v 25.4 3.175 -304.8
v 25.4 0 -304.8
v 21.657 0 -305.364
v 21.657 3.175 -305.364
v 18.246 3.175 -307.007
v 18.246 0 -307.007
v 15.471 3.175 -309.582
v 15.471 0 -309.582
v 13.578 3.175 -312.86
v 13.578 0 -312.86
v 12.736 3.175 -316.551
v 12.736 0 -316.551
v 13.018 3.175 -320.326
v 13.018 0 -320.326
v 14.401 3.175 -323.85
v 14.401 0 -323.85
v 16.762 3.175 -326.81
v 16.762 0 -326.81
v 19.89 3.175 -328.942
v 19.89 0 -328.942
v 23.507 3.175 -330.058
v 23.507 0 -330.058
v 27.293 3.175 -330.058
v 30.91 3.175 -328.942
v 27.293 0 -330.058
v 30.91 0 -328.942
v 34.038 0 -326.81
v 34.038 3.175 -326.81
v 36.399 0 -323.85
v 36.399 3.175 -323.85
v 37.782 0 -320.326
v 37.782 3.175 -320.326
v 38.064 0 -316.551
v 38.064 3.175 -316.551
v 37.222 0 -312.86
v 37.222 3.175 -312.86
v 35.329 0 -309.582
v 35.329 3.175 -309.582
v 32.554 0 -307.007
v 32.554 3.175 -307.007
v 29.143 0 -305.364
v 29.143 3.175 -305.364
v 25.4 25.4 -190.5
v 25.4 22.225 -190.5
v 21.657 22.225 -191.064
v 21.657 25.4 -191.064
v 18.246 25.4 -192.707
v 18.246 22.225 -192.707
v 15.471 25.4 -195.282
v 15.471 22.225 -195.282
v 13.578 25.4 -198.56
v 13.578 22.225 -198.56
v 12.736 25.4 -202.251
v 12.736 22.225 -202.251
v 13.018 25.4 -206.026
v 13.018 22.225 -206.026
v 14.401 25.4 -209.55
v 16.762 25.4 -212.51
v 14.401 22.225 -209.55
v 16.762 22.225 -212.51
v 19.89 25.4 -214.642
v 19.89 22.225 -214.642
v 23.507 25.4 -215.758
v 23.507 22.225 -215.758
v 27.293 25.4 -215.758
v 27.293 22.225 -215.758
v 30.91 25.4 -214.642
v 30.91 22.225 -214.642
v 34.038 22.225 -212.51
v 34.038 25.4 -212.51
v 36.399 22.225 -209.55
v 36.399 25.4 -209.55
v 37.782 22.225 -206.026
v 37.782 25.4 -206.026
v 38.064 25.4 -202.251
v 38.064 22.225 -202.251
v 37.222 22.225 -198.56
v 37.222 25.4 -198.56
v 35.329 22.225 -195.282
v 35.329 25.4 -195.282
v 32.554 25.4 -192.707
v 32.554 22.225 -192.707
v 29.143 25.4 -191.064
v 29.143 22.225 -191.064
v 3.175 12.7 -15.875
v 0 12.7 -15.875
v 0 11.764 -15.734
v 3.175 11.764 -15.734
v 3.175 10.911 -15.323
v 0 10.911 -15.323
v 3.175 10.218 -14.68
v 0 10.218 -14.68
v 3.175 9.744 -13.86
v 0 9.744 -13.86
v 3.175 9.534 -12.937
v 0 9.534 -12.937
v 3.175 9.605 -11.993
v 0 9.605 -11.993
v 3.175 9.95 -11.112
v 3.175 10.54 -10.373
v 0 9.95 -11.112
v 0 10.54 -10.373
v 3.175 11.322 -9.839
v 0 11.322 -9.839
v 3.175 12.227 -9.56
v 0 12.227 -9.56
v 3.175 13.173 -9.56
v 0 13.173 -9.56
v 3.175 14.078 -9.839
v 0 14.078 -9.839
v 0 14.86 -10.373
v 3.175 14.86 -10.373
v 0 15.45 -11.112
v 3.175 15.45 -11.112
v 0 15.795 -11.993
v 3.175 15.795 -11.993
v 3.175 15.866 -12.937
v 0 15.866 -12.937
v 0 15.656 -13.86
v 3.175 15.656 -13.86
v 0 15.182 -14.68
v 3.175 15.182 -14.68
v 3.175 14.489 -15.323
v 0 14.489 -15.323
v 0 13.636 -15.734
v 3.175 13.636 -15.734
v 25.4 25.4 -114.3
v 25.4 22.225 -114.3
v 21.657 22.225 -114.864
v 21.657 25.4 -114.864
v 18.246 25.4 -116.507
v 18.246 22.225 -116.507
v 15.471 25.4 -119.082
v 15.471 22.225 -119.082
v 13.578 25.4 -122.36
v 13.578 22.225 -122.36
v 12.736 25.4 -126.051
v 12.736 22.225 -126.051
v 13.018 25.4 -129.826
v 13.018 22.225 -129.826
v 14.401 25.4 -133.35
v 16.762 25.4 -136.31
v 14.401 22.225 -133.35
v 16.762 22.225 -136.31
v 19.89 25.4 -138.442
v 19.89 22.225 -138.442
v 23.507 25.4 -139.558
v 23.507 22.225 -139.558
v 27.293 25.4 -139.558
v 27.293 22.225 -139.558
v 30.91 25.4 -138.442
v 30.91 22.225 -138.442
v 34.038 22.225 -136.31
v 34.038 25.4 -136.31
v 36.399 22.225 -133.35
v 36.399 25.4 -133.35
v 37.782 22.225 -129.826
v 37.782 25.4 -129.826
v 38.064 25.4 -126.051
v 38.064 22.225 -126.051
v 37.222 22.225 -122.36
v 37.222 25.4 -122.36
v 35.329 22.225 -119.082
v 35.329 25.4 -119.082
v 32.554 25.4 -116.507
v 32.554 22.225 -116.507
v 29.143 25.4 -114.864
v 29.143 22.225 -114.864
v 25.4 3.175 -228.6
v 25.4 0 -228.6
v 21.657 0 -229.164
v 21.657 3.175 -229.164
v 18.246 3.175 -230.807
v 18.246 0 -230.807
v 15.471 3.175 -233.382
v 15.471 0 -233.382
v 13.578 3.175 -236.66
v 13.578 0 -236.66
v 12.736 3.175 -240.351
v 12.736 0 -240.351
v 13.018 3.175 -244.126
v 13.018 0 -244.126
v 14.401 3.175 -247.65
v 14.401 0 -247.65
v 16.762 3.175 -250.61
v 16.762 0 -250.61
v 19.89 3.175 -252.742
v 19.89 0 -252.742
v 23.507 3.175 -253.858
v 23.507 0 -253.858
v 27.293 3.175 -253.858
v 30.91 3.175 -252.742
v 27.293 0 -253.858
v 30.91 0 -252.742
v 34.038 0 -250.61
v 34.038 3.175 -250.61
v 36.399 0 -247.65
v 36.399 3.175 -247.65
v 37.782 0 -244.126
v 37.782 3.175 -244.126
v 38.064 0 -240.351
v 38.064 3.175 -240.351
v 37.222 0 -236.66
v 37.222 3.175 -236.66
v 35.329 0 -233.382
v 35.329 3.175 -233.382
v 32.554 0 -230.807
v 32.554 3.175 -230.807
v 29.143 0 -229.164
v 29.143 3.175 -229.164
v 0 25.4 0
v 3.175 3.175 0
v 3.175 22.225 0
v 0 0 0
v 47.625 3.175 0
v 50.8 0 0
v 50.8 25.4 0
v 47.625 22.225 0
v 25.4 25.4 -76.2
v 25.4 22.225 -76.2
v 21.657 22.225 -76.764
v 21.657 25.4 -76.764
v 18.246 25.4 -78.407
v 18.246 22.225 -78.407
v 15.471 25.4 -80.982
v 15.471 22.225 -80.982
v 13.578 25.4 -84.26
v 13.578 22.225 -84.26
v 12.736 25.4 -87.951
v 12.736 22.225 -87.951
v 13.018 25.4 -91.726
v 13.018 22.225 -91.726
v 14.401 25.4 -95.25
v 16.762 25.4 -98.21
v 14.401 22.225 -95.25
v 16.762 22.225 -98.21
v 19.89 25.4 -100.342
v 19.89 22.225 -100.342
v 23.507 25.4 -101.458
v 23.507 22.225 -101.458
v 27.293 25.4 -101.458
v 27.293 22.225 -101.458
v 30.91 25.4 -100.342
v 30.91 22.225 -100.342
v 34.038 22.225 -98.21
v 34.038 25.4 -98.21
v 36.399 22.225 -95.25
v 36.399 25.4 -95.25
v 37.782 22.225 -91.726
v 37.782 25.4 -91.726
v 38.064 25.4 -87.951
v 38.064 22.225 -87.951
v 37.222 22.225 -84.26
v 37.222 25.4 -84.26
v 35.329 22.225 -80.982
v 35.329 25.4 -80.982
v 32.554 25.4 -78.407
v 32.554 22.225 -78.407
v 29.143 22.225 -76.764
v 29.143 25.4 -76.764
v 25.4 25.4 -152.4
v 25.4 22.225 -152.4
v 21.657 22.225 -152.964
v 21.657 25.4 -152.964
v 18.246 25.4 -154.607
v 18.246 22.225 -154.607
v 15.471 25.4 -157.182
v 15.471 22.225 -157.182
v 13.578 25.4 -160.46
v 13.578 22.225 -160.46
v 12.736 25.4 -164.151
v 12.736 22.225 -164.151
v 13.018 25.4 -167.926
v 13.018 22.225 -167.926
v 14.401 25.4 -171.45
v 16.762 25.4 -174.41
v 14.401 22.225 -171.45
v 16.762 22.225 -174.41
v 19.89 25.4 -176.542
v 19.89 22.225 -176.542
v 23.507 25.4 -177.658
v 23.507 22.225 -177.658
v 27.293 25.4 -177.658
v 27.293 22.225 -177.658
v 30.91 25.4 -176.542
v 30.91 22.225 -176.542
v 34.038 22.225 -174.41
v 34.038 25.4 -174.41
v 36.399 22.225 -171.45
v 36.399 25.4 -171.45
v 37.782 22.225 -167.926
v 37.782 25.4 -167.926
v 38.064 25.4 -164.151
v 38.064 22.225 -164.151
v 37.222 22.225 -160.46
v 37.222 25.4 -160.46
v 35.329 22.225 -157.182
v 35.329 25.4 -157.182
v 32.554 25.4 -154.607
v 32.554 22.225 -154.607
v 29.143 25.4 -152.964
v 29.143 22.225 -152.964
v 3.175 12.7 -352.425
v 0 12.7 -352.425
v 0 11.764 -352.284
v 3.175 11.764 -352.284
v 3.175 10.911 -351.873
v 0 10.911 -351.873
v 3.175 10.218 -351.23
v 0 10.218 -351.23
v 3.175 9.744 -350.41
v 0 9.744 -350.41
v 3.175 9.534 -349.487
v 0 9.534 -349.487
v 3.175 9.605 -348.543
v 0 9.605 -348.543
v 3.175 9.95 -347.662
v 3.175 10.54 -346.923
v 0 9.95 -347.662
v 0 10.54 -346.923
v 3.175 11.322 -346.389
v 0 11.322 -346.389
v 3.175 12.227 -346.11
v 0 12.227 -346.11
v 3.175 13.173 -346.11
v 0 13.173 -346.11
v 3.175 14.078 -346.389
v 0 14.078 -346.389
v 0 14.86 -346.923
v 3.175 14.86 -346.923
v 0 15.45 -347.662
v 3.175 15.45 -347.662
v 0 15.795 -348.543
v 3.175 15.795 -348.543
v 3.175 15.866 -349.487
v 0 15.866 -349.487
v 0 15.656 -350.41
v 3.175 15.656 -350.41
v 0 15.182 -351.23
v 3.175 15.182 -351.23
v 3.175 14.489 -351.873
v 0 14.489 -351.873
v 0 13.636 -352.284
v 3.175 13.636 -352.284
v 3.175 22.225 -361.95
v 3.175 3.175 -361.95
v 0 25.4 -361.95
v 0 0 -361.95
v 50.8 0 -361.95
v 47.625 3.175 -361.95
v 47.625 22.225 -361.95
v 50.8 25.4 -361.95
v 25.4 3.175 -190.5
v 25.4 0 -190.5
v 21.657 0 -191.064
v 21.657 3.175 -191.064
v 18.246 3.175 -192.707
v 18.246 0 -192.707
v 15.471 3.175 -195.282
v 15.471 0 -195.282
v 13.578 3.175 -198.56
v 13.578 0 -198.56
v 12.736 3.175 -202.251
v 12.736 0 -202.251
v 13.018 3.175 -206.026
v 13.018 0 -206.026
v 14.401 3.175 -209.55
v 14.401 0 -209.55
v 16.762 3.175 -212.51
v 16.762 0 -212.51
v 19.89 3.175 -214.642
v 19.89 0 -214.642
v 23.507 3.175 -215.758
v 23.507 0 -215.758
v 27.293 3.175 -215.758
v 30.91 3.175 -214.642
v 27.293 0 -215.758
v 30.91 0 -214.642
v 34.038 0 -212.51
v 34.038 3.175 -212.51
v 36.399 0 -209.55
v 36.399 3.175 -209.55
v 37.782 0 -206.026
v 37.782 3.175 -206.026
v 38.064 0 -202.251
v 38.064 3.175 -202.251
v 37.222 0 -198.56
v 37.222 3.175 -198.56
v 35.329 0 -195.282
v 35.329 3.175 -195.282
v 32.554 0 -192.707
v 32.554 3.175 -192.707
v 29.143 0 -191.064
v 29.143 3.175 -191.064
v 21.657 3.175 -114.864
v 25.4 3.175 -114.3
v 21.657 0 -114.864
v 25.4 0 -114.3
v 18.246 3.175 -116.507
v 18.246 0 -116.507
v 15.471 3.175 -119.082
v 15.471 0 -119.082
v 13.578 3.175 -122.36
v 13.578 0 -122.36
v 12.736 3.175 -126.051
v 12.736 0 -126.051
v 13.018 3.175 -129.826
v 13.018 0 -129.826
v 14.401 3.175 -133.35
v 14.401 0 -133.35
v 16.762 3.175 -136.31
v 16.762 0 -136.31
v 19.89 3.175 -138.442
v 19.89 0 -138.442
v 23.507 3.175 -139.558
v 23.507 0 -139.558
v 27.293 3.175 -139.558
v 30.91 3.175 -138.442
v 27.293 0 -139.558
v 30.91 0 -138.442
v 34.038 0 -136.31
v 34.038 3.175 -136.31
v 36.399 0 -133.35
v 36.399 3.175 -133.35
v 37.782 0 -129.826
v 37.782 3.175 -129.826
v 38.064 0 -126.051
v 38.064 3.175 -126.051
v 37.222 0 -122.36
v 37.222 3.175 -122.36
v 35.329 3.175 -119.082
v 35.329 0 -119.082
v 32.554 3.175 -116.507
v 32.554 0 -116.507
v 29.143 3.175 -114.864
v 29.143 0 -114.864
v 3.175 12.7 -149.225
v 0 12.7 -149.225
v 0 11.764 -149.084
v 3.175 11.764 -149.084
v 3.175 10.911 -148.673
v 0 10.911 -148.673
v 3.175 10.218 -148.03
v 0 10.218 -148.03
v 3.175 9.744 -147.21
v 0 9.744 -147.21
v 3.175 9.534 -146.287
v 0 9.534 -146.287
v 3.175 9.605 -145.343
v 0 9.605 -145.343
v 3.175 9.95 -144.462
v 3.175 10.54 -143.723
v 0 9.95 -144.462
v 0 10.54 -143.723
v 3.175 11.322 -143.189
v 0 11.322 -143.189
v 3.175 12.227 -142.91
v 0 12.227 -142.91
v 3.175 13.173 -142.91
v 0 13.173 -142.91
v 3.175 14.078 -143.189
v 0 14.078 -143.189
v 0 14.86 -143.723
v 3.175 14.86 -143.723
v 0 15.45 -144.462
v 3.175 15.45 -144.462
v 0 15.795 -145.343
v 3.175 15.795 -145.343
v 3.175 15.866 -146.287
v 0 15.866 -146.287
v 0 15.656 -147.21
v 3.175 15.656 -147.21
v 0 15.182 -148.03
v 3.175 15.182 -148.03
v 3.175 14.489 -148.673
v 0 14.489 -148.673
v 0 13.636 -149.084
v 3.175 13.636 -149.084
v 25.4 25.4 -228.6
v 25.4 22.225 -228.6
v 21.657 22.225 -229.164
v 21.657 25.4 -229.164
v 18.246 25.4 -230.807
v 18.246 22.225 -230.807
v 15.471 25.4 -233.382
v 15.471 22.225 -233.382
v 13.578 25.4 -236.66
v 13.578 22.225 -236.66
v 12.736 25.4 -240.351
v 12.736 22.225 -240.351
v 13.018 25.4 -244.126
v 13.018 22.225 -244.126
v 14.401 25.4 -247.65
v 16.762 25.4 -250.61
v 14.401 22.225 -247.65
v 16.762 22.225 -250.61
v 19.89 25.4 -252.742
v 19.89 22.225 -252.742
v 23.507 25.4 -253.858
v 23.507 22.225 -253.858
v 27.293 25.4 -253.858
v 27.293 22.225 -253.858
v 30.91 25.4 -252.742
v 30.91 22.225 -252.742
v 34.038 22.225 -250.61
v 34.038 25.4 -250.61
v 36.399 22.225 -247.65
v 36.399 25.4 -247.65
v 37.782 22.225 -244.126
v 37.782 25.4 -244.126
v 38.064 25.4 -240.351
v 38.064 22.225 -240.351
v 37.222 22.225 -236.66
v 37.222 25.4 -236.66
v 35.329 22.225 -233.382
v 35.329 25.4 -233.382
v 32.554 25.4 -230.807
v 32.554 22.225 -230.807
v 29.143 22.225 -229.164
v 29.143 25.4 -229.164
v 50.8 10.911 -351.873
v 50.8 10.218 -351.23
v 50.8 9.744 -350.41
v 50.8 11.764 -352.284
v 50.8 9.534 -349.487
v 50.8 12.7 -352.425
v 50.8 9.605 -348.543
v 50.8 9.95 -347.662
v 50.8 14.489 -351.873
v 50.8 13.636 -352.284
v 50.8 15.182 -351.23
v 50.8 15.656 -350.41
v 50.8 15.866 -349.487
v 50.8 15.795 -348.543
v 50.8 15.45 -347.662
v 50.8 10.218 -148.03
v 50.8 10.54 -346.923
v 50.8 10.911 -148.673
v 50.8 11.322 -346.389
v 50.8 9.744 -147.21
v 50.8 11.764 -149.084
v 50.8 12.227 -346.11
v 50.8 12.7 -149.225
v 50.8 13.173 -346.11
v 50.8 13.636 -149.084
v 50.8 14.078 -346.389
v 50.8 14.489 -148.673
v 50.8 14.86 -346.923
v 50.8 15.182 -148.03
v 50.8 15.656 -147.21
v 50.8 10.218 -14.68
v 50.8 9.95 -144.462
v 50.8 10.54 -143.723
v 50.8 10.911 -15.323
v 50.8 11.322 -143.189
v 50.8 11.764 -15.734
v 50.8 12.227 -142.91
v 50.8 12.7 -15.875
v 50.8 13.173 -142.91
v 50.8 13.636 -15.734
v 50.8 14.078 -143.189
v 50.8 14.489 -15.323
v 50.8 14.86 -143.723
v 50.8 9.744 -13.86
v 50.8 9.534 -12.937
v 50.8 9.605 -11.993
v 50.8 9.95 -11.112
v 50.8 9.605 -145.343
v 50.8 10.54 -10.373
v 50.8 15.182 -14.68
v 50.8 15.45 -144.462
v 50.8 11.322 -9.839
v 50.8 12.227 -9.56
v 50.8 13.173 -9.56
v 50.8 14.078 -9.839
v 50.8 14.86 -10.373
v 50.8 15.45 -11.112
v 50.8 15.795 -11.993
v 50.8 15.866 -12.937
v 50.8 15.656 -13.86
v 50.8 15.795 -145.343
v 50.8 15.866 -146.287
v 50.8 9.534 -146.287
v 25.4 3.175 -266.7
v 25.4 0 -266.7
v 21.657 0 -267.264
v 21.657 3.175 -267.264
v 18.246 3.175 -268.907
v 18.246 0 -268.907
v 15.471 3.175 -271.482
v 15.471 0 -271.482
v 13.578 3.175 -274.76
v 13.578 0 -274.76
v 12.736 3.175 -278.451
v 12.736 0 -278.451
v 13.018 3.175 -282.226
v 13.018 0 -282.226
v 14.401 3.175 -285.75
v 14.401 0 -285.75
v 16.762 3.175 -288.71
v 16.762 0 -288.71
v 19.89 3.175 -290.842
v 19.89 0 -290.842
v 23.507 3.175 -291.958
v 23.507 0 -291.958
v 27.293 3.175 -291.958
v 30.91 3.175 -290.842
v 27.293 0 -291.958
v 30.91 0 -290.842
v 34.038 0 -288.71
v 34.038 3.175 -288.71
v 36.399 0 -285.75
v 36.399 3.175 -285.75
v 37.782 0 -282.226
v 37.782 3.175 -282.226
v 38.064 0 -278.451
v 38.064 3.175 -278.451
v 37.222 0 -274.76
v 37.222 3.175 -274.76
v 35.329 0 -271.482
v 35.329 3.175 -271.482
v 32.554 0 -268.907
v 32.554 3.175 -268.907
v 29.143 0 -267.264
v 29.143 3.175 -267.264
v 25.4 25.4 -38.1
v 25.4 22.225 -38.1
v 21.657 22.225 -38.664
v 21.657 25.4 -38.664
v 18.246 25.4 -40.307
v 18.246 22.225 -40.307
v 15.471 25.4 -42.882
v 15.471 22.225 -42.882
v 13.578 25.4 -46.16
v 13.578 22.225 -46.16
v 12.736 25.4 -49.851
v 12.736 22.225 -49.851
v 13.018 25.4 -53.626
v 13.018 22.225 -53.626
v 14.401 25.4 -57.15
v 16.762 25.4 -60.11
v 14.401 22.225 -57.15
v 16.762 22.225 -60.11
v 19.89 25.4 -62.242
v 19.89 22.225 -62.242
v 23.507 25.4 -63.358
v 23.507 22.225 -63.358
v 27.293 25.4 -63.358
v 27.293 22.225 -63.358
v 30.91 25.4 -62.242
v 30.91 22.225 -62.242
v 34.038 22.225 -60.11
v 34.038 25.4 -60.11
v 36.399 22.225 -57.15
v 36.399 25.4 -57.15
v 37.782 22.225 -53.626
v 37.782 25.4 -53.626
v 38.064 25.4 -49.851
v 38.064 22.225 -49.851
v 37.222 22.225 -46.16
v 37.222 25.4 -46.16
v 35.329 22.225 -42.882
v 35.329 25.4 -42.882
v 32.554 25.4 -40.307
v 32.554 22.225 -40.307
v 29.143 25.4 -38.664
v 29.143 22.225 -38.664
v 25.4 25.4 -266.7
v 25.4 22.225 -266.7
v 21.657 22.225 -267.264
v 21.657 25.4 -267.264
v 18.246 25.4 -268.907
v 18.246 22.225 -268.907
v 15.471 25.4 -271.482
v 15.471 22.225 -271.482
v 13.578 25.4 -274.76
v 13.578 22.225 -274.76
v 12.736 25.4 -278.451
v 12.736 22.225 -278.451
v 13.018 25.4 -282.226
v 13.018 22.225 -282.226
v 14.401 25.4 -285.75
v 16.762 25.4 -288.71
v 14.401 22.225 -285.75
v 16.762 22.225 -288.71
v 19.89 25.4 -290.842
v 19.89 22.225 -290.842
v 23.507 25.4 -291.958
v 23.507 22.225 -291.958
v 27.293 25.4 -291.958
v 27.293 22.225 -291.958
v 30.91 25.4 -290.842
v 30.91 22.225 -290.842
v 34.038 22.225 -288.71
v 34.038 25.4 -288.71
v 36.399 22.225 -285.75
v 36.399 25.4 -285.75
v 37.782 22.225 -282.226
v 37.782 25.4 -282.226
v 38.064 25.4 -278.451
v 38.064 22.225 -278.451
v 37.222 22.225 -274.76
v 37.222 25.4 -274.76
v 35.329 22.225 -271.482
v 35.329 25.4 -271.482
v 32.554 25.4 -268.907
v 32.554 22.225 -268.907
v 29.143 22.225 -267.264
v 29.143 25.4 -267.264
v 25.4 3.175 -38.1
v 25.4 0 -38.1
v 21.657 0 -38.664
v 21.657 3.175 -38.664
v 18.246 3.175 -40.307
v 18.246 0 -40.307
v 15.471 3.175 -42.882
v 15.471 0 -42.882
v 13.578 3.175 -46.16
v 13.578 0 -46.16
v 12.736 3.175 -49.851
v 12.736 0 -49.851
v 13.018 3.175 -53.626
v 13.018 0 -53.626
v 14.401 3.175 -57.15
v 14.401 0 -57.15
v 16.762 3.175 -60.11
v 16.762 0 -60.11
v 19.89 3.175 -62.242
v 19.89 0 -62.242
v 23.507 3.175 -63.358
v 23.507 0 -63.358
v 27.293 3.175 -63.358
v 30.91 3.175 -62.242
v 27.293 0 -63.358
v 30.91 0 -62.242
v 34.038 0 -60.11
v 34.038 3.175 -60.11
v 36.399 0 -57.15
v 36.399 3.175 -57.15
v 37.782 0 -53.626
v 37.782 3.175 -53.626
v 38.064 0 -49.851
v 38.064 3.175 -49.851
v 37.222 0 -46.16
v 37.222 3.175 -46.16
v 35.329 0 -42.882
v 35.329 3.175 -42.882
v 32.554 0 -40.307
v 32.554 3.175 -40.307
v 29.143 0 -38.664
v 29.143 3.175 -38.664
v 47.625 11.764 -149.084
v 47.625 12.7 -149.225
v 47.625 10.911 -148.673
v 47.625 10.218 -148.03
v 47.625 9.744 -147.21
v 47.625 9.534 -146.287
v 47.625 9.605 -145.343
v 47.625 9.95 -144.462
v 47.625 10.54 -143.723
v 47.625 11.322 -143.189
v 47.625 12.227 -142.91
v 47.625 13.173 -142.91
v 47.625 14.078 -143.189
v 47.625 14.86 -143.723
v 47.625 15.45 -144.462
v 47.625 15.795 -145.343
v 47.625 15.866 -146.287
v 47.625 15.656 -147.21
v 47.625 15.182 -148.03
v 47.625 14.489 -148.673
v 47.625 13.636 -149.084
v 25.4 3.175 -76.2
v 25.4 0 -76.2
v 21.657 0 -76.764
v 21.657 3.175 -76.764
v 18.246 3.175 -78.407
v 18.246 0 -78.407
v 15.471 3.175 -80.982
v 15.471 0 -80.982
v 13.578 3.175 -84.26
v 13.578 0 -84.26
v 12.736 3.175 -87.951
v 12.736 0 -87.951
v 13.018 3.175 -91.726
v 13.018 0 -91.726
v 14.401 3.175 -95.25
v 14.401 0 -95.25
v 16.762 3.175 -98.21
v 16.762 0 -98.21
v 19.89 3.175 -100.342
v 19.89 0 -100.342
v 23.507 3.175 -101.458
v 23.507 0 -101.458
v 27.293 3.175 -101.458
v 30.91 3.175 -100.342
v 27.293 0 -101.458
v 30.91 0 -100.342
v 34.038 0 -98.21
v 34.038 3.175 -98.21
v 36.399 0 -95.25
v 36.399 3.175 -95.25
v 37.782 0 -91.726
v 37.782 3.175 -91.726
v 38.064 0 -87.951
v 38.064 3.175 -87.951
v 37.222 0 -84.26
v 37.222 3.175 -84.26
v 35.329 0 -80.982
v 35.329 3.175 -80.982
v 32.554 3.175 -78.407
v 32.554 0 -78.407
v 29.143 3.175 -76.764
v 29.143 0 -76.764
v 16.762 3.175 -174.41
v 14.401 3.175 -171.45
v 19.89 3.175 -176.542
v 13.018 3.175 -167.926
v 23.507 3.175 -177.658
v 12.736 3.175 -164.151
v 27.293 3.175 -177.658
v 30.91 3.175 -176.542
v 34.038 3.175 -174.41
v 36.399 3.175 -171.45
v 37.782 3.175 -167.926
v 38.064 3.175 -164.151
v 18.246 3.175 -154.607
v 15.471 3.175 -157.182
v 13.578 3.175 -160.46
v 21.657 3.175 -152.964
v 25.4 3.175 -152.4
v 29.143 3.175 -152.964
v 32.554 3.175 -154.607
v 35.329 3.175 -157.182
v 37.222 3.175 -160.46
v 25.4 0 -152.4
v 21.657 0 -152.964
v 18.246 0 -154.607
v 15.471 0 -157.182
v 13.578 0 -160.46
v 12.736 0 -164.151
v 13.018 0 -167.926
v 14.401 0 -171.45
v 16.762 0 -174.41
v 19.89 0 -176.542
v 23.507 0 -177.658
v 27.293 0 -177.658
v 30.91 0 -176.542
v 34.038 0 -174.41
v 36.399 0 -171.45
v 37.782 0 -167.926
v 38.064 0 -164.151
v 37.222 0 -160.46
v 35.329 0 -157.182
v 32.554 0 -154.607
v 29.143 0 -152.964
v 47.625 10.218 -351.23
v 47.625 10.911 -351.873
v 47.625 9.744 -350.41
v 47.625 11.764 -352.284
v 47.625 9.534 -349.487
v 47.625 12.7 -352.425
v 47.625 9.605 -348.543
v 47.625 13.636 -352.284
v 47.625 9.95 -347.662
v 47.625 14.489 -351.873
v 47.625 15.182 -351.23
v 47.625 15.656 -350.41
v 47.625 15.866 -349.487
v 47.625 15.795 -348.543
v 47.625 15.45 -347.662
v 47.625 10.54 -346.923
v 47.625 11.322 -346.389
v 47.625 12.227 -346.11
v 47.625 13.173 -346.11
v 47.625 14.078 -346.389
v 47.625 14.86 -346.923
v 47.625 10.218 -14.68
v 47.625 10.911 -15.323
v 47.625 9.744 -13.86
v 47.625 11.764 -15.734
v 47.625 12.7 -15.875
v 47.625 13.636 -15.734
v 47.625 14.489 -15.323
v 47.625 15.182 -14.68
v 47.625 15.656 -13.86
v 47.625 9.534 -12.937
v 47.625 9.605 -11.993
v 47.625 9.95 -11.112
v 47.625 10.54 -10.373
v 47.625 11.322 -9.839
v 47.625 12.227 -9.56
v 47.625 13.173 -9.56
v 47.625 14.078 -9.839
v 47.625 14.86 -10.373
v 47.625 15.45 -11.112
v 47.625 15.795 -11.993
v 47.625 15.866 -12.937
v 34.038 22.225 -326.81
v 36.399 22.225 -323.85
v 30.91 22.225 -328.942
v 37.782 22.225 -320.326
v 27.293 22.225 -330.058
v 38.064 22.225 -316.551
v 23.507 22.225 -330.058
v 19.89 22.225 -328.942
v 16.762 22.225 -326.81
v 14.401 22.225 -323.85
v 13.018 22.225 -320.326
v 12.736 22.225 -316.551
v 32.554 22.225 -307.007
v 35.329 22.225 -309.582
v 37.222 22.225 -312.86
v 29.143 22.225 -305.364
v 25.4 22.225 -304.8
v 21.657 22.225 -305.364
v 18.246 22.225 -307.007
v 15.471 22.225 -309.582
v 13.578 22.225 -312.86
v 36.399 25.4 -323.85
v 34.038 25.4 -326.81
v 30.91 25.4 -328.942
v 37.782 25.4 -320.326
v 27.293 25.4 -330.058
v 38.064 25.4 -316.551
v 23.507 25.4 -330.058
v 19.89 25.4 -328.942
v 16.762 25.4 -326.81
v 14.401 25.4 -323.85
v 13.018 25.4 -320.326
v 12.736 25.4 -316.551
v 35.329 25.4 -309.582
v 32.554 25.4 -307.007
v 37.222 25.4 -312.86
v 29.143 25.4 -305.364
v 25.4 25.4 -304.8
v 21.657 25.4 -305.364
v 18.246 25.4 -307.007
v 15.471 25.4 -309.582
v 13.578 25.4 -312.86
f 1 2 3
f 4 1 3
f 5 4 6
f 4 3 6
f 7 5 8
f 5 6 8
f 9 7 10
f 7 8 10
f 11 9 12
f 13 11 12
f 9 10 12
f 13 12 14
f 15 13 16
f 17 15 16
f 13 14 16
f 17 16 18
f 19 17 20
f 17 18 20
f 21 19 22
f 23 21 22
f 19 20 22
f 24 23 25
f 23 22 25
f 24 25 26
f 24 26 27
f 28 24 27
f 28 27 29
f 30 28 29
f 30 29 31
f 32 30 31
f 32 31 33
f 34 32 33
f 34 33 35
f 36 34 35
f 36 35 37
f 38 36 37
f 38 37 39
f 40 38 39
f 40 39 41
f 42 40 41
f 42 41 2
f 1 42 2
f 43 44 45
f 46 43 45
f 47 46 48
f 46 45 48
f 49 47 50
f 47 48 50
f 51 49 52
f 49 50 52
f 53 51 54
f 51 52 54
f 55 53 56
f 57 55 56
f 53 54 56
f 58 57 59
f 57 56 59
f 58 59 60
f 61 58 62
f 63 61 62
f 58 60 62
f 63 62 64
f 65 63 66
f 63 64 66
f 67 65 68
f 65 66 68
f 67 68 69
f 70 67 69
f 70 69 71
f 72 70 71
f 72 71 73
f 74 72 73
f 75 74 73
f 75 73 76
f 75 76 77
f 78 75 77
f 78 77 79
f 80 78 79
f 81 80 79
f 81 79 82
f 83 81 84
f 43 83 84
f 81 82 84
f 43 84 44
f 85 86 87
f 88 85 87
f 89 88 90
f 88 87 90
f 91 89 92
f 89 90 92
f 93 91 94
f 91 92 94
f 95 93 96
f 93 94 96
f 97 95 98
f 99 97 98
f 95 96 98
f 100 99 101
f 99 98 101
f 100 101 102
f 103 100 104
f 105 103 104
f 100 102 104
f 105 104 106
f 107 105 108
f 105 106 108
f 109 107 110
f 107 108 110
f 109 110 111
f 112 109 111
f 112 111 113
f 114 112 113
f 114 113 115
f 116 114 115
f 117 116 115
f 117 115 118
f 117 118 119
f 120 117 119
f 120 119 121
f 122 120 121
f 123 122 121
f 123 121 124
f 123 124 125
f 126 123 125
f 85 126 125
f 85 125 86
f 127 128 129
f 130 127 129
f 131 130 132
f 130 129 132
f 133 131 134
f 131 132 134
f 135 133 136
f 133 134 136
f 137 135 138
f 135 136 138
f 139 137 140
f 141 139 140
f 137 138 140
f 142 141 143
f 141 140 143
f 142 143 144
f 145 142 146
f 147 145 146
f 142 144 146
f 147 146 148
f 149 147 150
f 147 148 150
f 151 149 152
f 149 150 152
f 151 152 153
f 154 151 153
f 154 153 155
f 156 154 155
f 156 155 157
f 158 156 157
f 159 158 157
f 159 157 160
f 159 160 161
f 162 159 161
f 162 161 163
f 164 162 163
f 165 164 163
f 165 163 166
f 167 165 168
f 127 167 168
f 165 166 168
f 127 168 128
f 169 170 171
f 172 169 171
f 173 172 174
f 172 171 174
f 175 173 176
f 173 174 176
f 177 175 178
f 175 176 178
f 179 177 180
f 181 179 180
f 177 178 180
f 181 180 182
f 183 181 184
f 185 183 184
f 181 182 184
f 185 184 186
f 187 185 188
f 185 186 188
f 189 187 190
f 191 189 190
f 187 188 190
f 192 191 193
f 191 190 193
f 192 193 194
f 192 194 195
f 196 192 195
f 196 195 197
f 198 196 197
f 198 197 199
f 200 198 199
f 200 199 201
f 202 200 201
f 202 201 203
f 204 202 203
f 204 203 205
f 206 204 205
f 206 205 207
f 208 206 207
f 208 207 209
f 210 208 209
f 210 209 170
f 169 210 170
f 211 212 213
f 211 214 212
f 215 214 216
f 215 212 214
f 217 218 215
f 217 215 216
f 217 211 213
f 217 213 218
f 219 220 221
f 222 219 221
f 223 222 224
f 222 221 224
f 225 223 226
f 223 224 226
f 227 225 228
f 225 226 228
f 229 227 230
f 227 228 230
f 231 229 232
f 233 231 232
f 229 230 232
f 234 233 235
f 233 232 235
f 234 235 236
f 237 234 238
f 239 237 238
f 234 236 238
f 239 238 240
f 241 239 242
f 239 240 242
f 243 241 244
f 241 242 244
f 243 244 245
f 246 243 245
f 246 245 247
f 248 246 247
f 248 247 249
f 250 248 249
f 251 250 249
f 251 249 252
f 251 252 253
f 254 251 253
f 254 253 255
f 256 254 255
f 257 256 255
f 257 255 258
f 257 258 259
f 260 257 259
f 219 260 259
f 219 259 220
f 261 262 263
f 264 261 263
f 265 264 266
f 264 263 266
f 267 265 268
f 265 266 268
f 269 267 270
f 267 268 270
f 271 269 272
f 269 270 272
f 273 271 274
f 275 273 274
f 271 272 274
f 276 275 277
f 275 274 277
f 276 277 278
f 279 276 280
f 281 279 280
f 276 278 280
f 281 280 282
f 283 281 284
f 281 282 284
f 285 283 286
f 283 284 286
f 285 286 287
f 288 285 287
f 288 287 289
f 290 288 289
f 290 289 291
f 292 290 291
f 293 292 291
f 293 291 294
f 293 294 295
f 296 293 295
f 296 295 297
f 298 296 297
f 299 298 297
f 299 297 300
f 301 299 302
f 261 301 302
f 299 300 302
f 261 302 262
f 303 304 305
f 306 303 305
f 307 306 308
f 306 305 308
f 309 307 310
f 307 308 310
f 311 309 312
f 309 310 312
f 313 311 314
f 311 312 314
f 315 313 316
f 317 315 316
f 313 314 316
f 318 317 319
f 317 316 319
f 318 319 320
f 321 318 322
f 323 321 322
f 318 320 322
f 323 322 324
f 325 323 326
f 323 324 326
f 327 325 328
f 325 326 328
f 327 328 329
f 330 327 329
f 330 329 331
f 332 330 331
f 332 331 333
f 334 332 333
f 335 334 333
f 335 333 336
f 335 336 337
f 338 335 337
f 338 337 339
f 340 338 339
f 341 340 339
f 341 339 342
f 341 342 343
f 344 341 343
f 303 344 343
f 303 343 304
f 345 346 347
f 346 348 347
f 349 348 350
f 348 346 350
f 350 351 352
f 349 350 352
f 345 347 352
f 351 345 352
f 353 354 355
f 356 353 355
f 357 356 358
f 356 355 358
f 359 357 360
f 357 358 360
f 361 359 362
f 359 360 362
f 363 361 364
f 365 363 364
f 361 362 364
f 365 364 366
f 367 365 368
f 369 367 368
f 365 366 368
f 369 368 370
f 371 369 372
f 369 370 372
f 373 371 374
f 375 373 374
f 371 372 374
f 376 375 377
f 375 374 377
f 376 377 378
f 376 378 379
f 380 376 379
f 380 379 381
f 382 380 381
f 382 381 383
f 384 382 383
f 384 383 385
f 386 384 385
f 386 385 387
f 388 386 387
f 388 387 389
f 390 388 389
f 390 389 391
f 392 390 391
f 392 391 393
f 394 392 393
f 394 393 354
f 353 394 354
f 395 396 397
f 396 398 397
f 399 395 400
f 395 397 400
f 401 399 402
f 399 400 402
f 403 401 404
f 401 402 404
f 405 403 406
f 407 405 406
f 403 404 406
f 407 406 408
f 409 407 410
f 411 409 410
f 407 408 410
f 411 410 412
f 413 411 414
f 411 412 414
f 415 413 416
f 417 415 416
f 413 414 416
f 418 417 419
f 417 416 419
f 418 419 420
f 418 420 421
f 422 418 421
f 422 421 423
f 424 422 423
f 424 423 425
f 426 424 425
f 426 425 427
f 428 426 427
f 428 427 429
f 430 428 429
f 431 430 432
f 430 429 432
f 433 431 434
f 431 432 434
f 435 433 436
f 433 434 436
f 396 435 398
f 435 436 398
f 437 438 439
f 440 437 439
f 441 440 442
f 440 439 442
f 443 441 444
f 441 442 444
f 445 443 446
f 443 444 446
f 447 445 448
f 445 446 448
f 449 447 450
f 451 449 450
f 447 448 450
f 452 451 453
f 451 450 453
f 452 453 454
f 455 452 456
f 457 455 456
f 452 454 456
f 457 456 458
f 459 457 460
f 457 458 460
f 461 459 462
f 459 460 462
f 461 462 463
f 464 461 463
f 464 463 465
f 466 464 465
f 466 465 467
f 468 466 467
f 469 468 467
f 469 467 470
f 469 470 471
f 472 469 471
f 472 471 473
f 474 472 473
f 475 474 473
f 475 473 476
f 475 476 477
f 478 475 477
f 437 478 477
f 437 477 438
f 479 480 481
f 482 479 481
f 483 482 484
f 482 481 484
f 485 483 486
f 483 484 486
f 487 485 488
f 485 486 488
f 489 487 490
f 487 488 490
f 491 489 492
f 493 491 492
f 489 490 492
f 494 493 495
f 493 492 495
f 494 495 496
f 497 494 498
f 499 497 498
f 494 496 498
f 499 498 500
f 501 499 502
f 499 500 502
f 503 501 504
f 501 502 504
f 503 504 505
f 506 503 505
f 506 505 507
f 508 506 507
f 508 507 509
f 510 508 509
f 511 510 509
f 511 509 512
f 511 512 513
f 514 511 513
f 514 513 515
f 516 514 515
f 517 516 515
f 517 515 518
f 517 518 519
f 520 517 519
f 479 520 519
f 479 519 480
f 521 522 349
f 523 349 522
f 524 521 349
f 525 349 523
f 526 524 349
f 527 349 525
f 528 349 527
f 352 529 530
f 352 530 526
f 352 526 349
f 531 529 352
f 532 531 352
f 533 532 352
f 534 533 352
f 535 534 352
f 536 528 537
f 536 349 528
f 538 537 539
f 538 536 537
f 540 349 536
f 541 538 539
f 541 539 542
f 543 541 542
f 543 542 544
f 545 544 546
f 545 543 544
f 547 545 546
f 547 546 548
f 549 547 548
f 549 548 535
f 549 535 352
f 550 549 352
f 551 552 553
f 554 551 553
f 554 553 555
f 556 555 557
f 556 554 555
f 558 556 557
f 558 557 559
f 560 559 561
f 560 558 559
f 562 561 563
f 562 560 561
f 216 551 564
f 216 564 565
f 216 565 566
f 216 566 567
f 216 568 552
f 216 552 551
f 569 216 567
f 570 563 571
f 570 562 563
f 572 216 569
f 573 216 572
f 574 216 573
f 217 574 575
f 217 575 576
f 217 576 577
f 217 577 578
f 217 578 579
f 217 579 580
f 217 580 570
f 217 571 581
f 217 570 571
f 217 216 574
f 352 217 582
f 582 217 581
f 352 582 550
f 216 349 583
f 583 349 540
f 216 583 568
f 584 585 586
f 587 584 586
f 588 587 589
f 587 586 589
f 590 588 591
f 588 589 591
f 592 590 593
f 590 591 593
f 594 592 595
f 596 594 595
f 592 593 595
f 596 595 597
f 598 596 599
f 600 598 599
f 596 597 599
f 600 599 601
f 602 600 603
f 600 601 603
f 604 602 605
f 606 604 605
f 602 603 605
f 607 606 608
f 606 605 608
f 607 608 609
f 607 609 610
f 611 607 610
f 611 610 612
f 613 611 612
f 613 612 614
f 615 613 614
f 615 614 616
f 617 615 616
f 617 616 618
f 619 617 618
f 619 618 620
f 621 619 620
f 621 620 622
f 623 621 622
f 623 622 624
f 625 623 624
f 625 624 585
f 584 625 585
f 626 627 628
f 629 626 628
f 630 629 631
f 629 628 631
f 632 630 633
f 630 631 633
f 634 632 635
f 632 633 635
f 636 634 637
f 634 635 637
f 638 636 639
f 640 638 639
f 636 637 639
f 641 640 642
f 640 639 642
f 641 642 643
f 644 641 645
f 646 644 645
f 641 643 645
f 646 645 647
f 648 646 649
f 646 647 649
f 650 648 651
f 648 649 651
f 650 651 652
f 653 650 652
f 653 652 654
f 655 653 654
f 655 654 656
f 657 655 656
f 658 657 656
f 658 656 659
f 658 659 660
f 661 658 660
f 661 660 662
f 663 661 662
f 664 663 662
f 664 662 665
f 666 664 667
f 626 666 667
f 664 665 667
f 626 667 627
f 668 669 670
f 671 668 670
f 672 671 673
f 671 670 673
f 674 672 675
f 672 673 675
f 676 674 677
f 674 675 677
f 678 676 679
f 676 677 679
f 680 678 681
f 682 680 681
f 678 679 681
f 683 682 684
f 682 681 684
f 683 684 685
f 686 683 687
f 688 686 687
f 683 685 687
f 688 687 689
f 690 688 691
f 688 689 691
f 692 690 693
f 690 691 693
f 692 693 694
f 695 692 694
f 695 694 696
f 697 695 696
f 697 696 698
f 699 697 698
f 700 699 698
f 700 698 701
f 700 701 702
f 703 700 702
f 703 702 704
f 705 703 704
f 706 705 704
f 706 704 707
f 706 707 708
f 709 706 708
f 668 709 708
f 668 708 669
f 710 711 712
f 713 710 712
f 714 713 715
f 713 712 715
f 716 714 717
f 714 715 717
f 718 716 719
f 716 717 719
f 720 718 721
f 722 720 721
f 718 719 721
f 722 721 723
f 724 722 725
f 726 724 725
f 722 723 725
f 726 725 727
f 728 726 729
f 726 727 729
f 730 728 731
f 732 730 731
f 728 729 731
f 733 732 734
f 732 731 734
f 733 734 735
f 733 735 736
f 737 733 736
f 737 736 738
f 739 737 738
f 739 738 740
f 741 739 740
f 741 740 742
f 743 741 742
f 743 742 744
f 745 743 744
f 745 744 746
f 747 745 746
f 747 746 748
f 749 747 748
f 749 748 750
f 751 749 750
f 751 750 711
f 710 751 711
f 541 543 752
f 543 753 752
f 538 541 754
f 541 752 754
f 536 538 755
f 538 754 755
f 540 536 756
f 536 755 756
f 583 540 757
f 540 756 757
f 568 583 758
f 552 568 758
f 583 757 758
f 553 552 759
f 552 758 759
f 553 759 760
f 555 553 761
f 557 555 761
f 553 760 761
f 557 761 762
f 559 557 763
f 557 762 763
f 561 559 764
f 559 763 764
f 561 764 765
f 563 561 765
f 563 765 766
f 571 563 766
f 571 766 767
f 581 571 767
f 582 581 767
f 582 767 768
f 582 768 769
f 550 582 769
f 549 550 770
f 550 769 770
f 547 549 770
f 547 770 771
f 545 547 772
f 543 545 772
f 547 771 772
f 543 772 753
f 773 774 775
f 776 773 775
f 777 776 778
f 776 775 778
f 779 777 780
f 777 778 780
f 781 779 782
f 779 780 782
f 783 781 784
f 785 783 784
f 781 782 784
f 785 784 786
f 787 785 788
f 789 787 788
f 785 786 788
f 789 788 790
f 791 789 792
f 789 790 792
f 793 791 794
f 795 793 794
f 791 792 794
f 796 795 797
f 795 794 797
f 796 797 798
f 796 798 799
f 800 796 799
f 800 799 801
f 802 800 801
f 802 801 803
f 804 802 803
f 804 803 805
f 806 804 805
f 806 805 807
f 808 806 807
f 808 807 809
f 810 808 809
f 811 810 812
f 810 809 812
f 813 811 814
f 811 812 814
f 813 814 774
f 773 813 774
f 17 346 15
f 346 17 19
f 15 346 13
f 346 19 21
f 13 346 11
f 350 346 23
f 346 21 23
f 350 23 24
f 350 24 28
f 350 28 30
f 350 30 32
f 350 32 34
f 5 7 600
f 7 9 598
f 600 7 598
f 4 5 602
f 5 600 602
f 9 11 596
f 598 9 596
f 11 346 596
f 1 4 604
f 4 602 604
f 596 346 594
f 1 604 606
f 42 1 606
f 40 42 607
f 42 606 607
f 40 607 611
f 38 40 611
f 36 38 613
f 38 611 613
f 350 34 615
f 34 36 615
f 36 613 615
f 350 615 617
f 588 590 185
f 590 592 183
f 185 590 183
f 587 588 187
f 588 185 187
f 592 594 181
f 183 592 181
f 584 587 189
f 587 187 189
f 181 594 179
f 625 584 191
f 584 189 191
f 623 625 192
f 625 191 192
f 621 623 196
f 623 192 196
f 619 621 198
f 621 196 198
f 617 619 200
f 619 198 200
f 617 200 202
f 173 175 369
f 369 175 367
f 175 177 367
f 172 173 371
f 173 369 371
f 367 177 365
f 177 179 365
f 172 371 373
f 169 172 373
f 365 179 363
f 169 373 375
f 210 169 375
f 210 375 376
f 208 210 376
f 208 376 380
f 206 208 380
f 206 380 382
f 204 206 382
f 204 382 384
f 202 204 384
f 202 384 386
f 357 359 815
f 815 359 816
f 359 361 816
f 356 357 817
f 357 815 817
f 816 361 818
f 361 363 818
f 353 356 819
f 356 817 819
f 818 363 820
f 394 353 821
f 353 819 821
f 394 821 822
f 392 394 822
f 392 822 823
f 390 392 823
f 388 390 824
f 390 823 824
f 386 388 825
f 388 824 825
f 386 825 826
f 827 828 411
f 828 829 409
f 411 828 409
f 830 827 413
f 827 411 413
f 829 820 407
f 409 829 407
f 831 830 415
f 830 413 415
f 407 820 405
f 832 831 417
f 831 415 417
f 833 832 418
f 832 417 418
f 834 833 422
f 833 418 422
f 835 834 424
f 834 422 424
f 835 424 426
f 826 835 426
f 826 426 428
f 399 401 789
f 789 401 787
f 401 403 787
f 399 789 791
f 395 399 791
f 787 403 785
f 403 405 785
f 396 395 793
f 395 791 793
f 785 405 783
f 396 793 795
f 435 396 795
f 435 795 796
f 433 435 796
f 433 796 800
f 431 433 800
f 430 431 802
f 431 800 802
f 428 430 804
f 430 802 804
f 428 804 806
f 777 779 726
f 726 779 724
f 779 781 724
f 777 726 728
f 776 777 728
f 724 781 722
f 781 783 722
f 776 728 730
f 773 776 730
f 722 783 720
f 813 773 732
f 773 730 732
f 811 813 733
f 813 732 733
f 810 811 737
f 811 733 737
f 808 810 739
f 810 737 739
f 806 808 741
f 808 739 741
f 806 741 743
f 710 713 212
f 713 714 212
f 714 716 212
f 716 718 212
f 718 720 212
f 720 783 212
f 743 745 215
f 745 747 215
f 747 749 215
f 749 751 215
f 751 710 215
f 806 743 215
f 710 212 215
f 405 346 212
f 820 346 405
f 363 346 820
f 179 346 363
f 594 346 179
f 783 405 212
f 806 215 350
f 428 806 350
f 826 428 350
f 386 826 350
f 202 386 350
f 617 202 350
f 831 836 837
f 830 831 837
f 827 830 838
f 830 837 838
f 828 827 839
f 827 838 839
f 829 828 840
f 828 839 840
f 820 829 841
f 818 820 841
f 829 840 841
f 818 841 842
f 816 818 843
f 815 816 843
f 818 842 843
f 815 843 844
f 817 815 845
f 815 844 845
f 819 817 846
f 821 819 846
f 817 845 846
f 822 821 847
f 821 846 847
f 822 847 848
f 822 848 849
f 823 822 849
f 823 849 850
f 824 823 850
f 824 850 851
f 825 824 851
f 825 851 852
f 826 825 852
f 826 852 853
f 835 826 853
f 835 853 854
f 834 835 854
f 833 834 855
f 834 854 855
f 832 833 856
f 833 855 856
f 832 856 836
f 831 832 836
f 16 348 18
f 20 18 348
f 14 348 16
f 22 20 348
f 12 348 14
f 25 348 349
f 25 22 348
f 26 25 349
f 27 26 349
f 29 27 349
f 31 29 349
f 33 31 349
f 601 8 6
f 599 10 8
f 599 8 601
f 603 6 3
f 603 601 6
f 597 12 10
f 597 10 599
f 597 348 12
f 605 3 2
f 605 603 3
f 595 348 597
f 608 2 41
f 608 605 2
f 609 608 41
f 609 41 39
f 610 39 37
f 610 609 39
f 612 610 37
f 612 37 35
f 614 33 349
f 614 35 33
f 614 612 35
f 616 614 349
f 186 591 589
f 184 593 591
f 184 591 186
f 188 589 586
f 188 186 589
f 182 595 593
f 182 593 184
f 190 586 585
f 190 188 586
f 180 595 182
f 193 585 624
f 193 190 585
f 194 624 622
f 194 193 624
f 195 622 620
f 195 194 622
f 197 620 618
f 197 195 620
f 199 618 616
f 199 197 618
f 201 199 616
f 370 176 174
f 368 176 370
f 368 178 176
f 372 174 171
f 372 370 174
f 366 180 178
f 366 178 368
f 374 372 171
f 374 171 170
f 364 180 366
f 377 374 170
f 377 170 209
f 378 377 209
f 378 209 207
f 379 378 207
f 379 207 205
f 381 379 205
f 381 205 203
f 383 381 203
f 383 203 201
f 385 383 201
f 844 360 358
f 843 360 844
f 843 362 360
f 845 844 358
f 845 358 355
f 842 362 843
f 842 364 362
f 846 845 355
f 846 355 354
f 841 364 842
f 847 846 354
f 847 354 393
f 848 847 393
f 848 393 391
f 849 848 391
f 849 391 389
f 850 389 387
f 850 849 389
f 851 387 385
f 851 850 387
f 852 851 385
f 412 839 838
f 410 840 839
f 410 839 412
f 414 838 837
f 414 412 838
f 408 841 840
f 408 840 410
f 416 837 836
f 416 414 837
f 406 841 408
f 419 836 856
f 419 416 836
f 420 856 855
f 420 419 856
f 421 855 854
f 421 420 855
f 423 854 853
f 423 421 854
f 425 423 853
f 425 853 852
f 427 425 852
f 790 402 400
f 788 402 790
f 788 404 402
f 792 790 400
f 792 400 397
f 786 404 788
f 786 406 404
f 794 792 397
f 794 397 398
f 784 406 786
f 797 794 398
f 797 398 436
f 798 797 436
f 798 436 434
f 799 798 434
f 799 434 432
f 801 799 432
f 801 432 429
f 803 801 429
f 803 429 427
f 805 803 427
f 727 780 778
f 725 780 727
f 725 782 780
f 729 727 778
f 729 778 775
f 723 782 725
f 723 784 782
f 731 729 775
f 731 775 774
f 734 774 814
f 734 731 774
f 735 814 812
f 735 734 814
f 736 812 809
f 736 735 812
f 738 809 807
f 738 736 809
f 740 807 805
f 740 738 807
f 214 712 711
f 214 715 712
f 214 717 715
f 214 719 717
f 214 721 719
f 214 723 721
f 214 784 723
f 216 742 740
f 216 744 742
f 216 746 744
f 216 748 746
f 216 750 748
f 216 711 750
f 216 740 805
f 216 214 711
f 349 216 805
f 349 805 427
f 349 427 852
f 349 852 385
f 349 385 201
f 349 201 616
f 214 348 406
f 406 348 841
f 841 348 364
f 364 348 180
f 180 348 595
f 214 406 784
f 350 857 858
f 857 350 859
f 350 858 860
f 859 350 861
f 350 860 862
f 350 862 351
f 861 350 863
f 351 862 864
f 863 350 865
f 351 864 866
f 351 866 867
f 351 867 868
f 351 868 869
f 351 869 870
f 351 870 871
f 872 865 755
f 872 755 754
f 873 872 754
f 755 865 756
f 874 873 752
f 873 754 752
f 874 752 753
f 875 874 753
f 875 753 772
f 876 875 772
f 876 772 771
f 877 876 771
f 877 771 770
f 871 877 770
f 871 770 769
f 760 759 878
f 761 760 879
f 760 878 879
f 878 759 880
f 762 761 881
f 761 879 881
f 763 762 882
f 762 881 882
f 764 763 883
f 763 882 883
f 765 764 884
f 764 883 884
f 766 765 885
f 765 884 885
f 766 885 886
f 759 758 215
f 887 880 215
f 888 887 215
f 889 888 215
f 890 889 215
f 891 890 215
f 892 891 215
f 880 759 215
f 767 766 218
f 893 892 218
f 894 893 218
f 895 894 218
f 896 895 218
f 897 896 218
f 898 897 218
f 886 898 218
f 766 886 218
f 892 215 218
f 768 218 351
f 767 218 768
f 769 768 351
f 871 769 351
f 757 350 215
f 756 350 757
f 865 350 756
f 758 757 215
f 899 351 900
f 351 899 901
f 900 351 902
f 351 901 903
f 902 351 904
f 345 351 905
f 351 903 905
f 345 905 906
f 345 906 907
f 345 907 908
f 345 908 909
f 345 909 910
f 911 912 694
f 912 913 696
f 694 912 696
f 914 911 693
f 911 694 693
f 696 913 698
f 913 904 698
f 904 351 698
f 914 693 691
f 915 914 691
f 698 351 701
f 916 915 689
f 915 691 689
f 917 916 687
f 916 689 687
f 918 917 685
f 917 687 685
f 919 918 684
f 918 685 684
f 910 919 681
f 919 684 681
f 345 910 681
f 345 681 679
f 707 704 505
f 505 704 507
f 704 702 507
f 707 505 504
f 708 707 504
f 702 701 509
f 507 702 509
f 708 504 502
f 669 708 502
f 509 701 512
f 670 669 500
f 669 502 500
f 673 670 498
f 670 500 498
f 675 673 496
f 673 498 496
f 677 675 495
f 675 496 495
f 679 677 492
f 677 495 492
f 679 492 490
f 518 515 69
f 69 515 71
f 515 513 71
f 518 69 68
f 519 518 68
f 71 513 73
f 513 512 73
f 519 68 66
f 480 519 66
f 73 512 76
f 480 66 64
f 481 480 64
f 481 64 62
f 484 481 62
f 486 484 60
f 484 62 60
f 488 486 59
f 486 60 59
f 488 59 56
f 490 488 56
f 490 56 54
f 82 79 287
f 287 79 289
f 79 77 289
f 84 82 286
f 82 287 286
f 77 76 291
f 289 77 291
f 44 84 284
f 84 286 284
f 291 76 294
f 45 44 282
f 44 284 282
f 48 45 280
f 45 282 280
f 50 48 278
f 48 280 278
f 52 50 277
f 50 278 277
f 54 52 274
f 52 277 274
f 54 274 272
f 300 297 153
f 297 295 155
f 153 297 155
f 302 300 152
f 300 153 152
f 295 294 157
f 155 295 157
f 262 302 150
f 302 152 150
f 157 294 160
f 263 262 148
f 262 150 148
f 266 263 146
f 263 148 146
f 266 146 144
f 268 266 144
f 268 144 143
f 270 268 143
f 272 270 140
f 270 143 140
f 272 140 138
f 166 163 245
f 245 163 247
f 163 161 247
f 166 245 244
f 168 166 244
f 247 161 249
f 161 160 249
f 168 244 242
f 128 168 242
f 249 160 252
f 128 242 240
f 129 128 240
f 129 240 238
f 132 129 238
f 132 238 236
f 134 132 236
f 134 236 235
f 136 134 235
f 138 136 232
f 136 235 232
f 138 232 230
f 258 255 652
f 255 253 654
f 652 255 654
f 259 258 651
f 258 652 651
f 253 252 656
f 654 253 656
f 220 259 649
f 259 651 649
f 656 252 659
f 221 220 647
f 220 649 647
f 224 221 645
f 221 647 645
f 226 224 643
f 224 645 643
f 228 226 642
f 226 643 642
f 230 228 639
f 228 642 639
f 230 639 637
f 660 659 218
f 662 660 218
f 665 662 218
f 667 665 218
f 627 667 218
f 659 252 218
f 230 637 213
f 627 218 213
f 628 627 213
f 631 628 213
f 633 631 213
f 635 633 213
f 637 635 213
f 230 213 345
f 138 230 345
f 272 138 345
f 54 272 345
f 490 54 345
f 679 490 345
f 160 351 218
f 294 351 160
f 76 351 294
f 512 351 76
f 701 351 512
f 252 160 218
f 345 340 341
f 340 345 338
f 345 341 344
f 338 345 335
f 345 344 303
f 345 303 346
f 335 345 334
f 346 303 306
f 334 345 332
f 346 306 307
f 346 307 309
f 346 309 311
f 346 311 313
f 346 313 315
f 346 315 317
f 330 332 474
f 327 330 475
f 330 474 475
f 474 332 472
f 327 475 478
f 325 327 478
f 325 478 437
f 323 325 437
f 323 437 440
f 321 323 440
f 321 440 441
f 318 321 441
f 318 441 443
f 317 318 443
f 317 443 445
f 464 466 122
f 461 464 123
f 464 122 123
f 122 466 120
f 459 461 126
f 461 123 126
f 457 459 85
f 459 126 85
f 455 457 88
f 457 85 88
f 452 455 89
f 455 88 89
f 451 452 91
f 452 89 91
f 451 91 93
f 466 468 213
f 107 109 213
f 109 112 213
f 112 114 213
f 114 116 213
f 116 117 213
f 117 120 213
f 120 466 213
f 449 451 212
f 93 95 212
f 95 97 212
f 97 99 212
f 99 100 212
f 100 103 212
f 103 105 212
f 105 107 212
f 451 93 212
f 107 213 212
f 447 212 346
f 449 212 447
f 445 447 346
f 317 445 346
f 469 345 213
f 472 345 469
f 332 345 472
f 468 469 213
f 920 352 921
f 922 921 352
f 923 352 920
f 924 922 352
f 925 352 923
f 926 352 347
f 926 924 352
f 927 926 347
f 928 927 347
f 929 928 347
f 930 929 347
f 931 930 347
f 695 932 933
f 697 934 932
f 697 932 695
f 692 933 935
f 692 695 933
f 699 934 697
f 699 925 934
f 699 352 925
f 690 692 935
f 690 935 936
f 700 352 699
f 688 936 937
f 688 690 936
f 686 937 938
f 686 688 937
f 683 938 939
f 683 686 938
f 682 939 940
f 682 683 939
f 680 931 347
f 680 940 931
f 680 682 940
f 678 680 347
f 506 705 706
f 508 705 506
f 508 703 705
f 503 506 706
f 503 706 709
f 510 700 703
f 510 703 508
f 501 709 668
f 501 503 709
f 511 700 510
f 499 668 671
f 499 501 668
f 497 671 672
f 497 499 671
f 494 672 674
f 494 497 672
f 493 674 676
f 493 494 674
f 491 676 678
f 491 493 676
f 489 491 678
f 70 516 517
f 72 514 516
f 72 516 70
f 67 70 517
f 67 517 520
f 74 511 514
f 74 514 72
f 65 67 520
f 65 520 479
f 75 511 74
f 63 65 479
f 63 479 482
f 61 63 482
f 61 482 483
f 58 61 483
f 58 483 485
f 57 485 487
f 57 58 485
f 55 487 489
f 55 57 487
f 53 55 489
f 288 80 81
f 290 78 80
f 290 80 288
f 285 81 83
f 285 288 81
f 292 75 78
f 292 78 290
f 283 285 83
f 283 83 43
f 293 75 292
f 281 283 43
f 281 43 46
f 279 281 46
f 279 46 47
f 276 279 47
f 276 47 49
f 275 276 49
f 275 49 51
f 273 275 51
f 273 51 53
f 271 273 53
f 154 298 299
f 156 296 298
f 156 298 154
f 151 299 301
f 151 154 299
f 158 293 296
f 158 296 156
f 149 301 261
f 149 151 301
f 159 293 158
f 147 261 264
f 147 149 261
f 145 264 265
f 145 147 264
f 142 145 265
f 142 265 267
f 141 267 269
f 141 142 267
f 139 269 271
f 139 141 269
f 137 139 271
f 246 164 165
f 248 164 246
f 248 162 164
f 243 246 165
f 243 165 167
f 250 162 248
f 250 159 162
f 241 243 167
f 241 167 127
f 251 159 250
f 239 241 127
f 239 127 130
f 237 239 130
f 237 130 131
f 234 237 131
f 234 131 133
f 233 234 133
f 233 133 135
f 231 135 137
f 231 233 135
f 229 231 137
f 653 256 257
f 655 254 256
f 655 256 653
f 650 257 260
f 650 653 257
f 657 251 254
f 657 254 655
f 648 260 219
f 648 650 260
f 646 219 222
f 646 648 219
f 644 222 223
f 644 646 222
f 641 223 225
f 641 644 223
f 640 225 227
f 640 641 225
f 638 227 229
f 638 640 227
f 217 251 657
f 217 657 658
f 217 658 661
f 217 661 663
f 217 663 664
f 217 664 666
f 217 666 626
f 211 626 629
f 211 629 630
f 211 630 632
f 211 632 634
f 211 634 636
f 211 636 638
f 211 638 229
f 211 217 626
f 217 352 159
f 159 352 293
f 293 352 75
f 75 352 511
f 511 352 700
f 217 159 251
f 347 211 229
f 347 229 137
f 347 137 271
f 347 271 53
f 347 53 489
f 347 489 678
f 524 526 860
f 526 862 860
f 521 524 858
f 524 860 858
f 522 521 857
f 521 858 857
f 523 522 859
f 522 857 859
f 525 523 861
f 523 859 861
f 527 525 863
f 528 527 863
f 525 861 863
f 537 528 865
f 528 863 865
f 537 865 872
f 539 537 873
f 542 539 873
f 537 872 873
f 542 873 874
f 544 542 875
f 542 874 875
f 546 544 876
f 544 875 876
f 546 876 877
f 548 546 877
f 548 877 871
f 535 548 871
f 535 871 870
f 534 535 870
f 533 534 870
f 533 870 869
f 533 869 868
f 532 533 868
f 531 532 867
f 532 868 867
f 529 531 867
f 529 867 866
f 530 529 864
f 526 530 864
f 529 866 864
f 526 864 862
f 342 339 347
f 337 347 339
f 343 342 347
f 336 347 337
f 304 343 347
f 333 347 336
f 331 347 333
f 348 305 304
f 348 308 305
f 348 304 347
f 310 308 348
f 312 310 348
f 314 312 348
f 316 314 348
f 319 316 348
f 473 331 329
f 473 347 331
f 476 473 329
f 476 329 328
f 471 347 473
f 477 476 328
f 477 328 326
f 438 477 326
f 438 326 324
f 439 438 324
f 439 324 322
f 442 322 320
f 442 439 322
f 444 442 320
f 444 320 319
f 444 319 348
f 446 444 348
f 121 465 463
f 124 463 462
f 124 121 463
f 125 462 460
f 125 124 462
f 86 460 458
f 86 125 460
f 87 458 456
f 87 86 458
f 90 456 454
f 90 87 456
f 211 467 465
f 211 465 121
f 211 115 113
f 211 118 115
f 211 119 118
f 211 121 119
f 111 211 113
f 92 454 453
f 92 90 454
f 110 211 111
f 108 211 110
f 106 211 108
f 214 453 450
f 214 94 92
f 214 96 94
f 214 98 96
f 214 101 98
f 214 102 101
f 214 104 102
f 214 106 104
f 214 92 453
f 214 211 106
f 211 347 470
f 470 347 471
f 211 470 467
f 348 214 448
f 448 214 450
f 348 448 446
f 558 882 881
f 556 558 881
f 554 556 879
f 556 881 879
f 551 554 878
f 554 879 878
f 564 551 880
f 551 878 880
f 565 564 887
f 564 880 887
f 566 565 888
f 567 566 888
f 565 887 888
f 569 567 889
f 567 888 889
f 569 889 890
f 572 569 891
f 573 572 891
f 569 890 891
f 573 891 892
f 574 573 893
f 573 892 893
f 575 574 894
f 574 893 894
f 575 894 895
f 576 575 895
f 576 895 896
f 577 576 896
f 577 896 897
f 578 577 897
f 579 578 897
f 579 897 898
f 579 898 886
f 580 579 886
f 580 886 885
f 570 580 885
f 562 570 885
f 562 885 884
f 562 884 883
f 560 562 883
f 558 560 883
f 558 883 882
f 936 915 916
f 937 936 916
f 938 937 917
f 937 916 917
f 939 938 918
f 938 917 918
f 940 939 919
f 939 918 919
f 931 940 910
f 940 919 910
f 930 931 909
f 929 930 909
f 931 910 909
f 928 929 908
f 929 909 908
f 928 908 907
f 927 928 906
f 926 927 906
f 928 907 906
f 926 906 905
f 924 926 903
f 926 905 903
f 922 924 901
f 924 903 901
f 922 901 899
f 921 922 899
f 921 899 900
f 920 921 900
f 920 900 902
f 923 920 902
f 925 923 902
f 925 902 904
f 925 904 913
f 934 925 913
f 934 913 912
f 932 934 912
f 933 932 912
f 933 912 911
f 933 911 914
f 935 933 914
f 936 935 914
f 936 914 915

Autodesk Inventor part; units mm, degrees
ref_plane "YZ Plane" through (0, 0, 0) normal (1, 0, 0) x (0, 1, 0)
ref_plane "XZ Plane" through (0, 0, 0) normal (0, 1, 0) x (-1, 0, 0)
ref_plane "XY Plane" through (0, 0, 0) normal (0, 0, 1) x (1, 0, 0)
sketch "Sketch1" plane through (0, 0, 0) normal (0, 0, 1) x (1, 0, 0)
  line L0 (0, 0) -> (50.8, 0)
  line L1 (50.8, 0) -> (50.8, 25.4)
  line L2 (50.8, 25.4) -> (0, 25.4)
  line L3 (0, 25.4) -> (0, 0)
  line L4 (3.175, 3.175) -> (47.625, 3.175)
  line L5 (47.625, 3.175) -> (47.625, 22.225)
  line L6 (47.625, 22.225) -> (3.175, 22.225)
  line L7 (3.175, 22.225) -> (3.175, 3.175)
  dimension "d0" = 50.8
  dimension "d1" = 25.4
  dimension "d2" = 44.45
  dimension "d3" = 19.05
  dimension "d4" = 3.175
  dimension "d5" = 3.175
extrude "Extrusion1" add sketch "Sketch1" against normal blind 361.95
sketch "Sketch2" plane through (50.8, 0, 0) normal (1, 0, 0) x (0, 0, -1)
  line L0 (0, 0) -> (0, 25.4) projected
  line L1 (0, 0) -> (361.95, 0) projected
  line L2 (361.95, 25.4) -> (361.95, 0) projected
  line L3 (0, 25.4) -> (361.95, 25.4) projected
  point P0 (146.05, 12.7)
  point P1 (349.25, 12.7)
  dimension "d8" = 12.7
  dimension "d9" = 12.7
  dimension "d10" = 215.9
  dimension "d11" = 12.7
hole "Hole1" at (50.8, 12.7, -146.05) at (50.8, 12.7, -349.25) direction (-1, 0, 0) diameter 6.35 end through all
sketch "Sketch3" plane through (50.8, 0, 0) normal (1, 0, 0) x (0, 0, -1)
  circle A0 centre (146.05, 12.7) radius 3.175 projected
  circle A1 centre (349.25, 12.7) radius 3.175 projected
  line L0 (0, 0) -> (0, 25.4) projected
  line L1 (0, 0) -> (361.95, 0) projected
  line L2 (361.95, 25.4) -> (361.95, 0) projected
  line L3 (0, 25.4) -> (361.95, 25.4) projected
  point P0 (12.7, 12.7)
  dimension "d19" = 12.7
  dimension "d20" = 12.7
hole "Hole2" at (50.8, 12.7, -12.7) direction (-1, 0, 0) diameter 6.35 end through all
sketch "Sketch4" plane through (0, 25.4, 0) normal (0, 1, 0) x (1, 0, 0)
  line L0 (50.8, 0) -> (0, 0) projected
  line L1 (50.8, 0) -> (50.8, 361.95) projected
  line L2 (0, 361.95) -> (50.8, 361.95) projected
  line L3 (0, 0) -> (0, 361.95) projected
  point P0 (25.4, 50.8)
  dimension "d28" = 25.4
  dimension "d29" = 50.8
hole "Hole3" at (25.4, 25.4, -50.8) direction (0, -1, 0) diameter 25.4 end through all
pattern_linear "Rectangular Pattern1" count 8 spacing 38.1 along (0, 0, -1) of "Hole3"
properties part number "2x1 mounting" material "Aluminum 6061"
